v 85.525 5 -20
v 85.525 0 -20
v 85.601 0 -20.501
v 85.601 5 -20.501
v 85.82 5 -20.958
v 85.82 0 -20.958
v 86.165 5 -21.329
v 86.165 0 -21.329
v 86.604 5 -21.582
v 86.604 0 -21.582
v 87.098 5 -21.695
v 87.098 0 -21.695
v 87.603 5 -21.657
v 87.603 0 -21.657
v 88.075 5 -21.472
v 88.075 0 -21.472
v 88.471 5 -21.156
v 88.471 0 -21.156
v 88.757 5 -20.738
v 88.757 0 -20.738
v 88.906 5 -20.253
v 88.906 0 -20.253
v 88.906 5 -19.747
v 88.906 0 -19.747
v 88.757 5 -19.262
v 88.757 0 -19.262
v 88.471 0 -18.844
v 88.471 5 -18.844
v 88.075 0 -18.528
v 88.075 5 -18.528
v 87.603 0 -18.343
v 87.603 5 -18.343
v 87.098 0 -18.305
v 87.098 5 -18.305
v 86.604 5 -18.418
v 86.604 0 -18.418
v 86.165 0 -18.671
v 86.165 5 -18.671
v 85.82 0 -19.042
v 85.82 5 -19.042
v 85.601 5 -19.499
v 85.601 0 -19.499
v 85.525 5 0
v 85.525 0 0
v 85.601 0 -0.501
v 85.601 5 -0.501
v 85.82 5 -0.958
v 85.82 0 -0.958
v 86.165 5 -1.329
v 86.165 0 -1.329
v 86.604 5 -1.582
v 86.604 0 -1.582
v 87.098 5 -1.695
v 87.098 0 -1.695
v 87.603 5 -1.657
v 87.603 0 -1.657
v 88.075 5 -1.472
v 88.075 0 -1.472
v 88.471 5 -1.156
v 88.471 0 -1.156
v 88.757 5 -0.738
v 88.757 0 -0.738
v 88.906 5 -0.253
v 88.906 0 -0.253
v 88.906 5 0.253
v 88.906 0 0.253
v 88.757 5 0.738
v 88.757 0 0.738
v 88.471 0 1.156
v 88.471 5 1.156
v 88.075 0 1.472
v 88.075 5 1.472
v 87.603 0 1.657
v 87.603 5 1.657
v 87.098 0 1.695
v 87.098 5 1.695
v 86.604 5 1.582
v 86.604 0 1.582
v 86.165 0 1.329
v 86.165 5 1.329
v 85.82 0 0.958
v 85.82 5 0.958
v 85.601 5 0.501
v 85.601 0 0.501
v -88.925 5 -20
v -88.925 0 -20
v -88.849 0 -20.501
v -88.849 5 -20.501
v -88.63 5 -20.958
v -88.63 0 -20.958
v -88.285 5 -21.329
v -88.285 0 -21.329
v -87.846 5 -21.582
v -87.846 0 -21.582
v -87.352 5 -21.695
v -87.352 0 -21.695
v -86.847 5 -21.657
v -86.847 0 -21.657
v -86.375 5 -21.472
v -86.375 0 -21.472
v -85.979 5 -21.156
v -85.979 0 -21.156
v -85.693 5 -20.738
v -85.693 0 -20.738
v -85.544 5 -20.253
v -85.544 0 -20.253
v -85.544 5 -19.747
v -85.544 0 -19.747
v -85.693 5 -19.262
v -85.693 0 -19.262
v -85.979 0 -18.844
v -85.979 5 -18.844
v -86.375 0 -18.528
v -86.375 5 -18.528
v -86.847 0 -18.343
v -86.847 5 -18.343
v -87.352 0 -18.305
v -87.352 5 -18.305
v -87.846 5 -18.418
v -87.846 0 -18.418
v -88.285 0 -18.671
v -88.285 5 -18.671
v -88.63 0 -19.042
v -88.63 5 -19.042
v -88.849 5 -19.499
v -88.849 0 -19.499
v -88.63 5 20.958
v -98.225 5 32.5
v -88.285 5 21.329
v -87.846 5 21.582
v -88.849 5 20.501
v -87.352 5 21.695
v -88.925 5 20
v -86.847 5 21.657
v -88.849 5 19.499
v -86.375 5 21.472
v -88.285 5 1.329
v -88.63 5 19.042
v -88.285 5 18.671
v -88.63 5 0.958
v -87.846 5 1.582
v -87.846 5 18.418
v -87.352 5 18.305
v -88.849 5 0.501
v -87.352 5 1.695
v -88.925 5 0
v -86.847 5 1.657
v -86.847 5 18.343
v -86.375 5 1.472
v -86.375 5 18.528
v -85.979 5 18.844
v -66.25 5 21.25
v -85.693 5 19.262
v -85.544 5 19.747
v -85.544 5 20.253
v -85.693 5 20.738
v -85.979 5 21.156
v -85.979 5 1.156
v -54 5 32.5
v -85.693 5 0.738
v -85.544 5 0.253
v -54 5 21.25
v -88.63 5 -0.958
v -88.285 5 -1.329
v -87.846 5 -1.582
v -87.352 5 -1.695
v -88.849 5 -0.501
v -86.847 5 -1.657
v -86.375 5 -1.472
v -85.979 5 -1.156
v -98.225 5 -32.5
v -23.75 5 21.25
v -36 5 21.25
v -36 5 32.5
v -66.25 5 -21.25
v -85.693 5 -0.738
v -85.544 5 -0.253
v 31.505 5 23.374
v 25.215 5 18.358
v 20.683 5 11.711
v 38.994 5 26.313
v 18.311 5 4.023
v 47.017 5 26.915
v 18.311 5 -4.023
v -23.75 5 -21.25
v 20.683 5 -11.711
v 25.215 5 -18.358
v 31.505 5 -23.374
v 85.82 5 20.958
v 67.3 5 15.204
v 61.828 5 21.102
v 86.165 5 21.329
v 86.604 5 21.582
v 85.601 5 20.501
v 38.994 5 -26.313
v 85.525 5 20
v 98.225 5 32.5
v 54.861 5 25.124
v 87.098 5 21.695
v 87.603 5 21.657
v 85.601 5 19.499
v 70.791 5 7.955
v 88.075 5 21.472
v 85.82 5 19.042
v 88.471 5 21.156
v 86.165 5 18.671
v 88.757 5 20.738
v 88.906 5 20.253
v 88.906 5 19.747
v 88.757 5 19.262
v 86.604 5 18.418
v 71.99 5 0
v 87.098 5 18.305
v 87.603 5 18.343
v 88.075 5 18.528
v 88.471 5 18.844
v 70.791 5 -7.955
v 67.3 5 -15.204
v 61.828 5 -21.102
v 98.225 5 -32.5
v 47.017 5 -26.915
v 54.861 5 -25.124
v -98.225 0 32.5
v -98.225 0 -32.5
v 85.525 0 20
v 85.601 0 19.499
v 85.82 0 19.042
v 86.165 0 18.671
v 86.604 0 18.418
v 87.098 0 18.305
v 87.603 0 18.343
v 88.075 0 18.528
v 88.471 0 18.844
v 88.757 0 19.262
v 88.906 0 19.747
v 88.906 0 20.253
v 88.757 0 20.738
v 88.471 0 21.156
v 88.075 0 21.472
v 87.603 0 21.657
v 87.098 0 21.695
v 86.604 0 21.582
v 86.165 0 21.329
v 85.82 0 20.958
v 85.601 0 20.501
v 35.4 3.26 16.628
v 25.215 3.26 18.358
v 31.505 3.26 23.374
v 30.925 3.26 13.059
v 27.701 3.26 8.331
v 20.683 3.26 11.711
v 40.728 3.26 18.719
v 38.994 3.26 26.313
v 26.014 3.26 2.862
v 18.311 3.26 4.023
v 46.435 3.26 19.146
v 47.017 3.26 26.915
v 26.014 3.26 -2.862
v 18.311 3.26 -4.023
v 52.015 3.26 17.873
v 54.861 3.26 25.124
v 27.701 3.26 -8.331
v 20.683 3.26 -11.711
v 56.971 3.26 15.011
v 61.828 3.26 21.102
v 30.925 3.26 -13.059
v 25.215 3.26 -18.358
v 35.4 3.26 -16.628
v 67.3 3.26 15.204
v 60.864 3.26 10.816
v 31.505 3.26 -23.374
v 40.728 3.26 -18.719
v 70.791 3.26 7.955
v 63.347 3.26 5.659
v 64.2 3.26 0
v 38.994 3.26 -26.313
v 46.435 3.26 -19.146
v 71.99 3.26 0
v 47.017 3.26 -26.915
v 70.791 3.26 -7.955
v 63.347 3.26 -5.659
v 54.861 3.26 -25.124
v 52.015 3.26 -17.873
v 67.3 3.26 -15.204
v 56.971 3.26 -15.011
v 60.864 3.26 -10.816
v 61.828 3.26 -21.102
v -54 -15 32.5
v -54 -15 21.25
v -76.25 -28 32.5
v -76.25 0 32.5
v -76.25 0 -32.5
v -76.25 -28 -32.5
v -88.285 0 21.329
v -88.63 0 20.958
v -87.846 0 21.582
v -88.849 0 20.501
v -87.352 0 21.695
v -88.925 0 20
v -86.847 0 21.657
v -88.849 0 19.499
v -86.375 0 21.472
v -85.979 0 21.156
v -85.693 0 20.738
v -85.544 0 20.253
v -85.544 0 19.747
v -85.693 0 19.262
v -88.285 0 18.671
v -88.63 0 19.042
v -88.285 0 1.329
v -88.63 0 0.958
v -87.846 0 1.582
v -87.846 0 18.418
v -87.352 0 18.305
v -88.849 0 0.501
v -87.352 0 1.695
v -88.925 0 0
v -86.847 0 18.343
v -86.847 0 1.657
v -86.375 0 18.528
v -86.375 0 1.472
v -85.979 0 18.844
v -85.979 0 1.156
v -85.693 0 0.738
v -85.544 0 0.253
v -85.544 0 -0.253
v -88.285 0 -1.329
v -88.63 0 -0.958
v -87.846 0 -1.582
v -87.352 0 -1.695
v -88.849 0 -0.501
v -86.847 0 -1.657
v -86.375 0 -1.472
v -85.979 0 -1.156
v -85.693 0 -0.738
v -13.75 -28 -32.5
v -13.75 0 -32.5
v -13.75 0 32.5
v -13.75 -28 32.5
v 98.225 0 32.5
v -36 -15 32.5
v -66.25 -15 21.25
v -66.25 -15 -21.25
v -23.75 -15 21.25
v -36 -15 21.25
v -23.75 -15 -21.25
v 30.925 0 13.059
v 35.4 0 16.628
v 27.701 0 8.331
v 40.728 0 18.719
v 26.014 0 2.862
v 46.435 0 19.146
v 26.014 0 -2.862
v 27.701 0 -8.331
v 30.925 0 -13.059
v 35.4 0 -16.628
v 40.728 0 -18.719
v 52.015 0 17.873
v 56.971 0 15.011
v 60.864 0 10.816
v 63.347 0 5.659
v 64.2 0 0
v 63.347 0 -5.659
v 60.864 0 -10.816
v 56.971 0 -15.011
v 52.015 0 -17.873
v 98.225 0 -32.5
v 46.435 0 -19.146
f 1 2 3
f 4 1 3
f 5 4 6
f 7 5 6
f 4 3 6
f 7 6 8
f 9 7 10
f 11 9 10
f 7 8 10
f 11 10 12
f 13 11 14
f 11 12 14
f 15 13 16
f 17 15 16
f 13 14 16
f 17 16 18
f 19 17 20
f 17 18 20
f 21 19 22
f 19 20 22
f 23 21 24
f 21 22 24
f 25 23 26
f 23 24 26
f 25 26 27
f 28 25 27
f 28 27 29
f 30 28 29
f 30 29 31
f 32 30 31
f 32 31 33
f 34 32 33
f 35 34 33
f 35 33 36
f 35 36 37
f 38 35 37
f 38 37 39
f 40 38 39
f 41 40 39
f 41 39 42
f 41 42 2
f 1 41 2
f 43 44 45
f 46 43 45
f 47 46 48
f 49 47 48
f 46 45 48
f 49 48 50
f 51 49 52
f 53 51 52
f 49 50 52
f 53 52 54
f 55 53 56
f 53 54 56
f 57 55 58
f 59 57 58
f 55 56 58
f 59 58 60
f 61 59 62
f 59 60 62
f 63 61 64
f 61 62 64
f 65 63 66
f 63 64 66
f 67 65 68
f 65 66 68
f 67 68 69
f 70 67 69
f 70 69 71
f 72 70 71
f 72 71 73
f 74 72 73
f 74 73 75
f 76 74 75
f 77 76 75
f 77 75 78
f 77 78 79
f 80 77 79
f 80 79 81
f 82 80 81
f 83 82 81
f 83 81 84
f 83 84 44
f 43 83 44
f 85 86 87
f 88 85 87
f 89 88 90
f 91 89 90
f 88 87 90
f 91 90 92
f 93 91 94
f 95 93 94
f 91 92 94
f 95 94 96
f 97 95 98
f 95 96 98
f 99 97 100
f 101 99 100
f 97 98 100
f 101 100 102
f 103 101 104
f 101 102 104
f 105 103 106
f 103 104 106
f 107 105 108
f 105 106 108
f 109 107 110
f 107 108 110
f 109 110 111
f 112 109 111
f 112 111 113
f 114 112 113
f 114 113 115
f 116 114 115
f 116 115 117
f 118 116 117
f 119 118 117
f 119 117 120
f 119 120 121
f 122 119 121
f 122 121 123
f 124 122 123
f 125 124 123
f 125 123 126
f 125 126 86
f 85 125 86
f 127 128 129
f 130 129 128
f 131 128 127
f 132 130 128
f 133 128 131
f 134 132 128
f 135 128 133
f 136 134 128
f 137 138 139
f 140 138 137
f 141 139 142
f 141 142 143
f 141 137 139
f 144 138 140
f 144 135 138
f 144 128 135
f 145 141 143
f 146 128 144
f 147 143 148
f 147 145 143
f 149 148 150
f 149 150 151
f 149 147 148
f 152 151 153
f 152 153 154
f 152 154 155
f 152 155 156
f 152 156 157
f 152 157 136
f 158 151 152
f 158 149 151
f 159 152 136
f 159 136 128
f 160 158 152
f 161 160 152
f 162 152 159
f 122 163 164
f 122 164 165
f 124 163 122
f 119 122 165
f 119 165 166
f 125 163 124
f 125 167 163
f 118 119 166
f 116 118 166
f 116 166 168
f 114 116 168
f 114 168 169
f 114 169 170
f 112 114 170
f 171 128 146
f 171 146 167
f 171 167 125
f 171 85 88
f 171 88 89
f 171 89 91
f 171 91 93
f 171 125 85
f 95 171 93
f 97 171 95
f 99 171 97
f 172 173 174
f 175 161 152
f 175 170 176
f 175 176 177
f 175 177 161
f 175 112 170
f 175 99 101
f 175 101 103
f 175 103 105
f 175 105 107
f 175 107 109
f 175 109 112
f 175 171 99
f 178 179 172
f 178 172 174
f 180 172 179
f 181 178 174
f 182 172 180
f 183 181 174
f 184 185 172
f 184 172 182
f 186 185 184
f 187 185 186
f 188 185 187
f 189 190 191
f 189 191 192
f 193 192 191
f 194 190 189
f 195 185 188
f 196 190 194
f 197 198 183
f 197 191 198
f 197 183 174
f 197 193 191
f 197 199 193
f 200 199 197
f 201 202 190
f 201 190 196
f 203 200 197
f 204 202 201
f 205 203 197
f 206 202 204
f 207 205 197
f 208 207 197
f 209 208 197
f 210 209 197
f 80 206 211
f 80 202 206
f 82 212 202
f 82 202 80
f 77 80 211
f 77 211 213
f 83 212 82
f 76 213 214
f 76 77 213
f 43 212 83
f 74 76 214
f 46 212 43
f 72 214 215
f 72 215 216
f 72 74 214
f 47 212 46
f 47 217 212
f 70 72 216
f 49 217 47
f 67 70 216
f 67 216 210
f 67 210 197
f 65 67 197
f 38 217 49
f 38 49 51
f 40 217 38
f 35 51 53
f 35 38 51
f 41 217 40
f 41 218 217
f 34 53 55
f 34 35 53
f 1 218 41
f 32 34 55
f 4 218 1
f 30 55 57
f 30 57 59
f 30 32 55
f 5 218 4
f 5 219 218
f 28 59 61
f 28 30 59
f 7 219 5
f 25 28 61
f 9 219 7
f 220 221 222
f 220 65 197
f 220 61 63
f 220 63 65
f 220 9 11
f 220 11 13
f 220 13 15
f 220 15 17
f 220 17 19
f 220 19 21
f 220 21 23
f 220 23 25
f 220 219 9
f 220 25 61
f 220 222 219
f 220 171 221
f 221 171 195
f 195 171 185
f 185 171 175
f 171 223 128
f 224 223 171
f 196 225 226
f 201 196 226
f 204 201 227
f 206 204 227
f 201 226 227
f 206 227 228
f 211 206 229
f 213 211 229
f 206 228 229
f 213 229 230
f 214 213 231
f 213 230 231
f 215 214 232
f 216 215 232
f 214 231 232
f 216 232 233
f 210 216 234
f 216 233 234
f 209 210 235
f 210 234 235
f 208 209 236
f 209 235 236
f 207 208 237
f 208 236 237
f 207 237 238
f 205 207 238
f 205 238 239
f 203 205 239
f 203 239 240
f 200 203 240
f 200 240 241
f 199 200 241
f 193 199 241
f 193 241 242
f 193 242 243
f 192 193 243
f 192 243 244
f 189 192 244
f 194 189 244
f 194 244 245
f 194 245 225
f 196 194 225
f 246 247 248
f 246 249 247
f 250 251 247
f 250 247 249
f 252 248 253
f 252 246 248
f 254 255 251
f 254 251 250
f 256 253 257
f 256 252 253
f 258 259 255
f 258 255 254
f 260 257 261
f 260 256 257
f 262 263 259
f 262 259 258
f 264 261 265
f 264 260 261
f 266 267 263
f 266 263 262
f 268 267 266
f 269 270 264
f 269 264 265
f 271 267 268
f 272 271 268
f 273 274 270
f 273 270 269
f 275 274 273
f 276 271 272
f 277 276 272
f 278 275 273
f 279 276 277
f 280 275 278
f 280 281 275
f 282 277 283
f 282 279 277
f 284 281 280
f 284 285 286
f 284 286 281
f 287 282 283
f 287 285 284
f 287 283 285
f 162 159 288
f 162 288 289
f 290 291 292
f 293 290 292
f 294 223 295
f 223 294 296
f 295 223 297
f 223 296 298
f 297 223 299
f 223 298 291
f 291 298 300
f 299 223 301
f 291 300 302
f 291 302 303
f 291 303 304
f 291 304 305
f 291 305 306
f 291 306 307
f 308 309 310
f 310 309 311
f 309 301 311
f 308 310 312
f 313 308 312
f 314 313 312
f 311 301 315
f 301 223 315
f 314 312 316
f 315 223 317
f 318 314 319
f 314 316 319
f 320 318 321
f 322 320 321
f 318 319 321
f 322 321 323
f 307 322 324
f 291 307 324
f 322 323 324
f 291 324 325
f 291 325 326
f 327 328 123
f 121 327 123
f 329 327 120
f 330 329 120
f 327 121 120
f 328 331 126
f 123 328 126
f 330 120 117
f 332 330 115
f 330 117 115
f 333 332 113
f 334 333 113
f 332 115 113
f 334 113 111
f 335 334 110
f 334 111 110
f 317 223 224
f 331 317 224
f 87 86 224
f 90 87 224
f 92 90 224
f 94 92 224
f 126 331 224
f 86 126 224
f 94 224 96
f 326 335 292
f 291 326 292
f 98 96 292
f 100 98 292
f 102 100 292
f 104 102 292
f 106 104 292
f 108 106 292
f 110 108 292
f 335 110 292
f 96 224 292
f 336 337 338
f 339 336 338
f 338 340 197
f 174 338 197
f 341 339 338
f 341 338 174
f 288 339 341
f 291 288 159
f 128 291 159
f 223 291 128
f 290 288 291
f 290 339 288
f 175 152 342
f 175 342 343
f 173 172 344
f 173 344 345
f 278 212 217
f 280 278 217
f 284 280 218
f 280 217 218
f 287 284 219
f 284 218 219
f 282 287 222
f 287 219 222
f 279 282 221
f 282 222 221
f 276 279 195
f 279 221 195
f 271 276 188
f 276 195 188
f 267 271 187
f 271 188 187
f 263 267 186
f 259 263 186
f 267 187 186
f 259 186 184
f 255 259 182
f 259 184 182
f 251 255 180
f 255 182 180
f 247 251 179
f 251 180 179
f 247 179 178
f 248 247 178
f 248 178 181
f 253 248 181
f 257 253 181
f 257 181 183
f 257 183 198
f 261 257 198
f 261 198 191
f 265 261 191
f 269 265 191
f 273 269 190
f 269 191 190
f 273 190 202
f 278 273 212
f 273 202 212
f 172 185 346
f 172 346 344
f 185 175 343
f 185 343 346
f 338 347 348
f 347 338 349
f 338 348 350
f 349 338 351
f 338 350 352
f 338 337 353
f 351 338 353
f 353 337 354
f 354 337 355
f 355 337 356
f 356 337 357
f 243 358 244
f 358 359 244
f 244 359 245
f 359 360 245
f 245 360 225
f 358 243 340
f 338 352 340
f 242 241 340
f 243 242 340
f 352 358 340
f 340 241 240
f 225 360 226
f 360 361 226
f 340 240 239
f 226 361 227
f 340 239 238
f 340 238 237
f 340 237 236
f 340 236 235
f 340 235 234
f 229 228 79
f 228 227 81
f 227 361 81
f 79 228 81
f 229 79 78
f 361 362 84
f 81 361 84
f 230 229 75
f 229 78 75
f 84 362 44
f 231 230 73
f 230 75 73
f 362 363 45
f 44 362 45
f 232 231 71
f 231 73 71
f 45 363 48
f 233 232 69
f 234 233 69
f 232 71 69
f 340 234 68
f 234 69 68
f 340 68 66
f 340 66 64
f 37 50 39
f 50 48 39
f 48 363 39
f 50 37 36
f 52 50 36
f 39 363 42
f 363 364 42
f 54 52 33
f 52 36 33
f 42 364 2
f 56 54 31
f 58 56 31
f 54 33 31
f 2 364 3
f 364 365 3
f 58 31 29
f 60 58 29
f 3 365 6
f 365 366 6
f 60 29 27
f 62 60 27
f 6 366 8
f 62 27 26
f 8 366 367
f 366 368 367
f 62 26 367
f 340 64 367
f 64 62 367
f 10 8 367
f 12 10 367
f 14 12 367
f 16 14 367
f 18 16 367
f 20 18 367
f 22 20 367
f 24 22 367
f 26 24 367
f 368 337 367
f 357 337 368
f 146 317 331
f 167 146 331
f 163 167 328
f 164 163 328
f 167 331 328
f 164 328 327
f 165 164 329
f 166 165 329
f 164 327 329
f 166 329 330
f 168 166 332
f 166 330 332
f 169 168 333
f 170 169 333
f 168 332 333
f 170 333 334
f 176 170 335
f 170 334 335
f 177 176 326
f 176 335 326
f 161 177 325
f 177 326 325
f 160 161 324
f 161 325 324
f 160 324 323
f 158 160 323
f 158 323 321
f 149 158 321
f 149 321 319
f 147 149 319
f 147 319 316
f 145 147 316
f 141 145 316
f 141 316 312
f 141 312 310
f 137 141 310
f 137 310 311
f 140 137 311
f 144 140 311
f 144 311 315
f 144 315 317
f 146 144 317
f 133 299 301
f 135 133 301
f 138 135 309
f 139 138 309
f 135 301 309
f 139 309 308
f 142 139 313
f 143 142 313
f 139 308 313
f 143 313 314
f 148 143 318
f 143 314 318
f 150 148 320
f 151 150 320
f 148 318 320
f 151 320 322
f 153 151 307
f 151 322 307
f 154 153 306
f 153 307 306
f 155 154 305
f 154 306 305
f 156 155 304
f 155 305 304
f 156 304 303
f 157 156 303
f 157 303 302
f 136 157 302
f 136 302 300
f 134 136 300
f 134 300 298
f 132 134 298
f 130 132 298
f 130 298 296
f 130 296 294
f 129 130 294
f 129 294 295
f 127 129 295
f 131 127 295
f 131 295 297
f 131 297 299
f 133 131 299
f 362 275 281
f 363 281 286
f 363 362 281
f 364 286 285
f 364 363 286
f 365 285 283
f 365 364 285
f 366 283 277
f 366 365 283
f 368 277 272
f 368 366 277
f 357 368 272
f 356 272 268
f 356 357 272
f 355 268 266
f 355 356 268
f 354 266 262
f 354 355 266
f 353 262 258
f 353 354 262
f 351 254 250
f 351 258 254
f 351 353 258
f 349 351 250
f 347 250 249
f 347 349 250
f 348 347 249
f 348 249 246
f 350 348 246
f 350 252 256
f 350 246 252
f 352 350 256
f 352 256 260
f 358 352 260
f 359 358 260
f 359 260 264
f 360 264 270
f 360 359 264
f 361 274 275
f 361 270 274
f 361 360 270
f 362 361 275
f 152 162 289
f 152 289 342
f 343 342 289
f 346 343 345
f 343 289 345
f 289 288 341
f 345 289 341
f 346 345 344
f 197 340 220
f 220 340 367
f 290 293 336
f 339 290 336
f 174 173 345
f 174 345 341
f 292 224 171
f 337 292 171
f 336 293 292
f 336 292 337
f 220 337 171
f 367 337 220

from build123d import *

# Parameters (mm, degrees)
SKETCH2_W            = 196.45
SKETCH2_H            = 65
BOSS_EXTRUDE1_DEPTH  = 5
BOSS_EXTRUDE2_DEPTH  = 28
BOSS_EXTRUDE3_DEPTH  = 20
CUT_EXTRUDE9_START   = -33
CUT_EXTRUDE9_DEPTH   = 20
SKETCH4_R            = 26.99
CUT_EXTRUDE3_DEPTH   = 1.74
SKETCH3_4_R          = 19.2
CUT_EXTRUDE10_DEPTH  = 20
M3_CLEARANCE_HOLE1_D = 3.4


with BuildPart() as part:
    # Sketch2 → Boss-Extrude1 (new body)
    with BuildSketch(Plane(origin=(0, 0, 0), x_dir=(1, 0, 0), z_dir=(0, 1, 0))):
        Rectangle(SKETCH2_W, SKETCH2_H)
    extrude(amount=BOSS_EXTRUDE1_DEPTH)

    # Sketch3 → Boss-Extrude2 (add)
    with BuildSketch(Plane(origin=(0, 0, 0), x_dir=(1, 0, 0), z_dir=(0, 1, 0))):
        Polygon((-36, -32.5), (-36, -21.25), (-23.75, -21.25), (-23.75, 21.25), (-66.25, 21.25), (-66.25, -21.25), (-54, -21.25), (-54, -32.5), (-76.25, -32.5), (-76.25, 32.5), (-13.75, 32.5), (-13.75, -32.5), align=None)
    extrude(amount=-BOSS_EXTRUDE2_DEPTH)

    # Sketch12 → Boss-Extrude3 (add)
    with BuildSketch(Plane.XZ.offset(28)):
        Polygon((-36, 21.25), (-36, 32.5), (-54, 32.5), (-54, 21.25), (-66.25, 21.25), (-66.25, -21.25), (-23.75, -21.25), (-23.75, 21.25), align=None)
    extrude(amount=-BOSS_EXTRUDE3_DEPTH)

    # Sketch12<2> → Cut-Extrude9 (cut)
    with BuildSketch(Plane.XZ.offset(28).offset(CUT_EXTRUDE9_START)):
        Polygon((-36, 21.25), (-36, 32.5), (-54, 32.5), (-54, 21.25), (-66.25, 21.25), (-66.25, -21.25), (-23.75, -21.25), (-23.75, 21.25), align=None)
    extrude(amount=CUT_EXTRUDE9_DEPTH, mode=Mode.SUBTRACT)

    # Sketch4 → Cut-Extrude3 (cut)
    with BuildSketch(Plane(origin=(0, 5, 0), x_dir=(1, 0, 0), z_dir=(0, 1, 0))):
        with Locations((45, 0)):
            Circle(SKETCH4_R)
    extrude(amount=-CUT_EXTRUDE3_DEPTH, mode=Mode.SUBTRACT)

    # Sketch3<4> → Cut-Extrude10 (cut)
    with BuildSketch(Plane(origin=(0, 0, 0), x_dir=(1, 0, 0), z_dir=(0, 1, 0))):
        with Locations((45, 0)):
            Circle(SKETCH3_4_R)
    extrude(amount=CUT_EXTRUDE10_DEPTH, mode=Mode.SUBTRACT)

    # M3 Clearance Hole1 (through all)
    with Locations(Plane(origin=(0, 5, 0), x_dir=(1, 0, 0), z_dir=(0, 1, 0))):
        with Locations((-87.225, 20), (-87.225, 0), (-87.225, -20), (87.225, -20), (87.225, 0), (87.225, 20)):
            Hole(M3_CLEARANCE_HOLE1_D / 2)


solid = part.part
